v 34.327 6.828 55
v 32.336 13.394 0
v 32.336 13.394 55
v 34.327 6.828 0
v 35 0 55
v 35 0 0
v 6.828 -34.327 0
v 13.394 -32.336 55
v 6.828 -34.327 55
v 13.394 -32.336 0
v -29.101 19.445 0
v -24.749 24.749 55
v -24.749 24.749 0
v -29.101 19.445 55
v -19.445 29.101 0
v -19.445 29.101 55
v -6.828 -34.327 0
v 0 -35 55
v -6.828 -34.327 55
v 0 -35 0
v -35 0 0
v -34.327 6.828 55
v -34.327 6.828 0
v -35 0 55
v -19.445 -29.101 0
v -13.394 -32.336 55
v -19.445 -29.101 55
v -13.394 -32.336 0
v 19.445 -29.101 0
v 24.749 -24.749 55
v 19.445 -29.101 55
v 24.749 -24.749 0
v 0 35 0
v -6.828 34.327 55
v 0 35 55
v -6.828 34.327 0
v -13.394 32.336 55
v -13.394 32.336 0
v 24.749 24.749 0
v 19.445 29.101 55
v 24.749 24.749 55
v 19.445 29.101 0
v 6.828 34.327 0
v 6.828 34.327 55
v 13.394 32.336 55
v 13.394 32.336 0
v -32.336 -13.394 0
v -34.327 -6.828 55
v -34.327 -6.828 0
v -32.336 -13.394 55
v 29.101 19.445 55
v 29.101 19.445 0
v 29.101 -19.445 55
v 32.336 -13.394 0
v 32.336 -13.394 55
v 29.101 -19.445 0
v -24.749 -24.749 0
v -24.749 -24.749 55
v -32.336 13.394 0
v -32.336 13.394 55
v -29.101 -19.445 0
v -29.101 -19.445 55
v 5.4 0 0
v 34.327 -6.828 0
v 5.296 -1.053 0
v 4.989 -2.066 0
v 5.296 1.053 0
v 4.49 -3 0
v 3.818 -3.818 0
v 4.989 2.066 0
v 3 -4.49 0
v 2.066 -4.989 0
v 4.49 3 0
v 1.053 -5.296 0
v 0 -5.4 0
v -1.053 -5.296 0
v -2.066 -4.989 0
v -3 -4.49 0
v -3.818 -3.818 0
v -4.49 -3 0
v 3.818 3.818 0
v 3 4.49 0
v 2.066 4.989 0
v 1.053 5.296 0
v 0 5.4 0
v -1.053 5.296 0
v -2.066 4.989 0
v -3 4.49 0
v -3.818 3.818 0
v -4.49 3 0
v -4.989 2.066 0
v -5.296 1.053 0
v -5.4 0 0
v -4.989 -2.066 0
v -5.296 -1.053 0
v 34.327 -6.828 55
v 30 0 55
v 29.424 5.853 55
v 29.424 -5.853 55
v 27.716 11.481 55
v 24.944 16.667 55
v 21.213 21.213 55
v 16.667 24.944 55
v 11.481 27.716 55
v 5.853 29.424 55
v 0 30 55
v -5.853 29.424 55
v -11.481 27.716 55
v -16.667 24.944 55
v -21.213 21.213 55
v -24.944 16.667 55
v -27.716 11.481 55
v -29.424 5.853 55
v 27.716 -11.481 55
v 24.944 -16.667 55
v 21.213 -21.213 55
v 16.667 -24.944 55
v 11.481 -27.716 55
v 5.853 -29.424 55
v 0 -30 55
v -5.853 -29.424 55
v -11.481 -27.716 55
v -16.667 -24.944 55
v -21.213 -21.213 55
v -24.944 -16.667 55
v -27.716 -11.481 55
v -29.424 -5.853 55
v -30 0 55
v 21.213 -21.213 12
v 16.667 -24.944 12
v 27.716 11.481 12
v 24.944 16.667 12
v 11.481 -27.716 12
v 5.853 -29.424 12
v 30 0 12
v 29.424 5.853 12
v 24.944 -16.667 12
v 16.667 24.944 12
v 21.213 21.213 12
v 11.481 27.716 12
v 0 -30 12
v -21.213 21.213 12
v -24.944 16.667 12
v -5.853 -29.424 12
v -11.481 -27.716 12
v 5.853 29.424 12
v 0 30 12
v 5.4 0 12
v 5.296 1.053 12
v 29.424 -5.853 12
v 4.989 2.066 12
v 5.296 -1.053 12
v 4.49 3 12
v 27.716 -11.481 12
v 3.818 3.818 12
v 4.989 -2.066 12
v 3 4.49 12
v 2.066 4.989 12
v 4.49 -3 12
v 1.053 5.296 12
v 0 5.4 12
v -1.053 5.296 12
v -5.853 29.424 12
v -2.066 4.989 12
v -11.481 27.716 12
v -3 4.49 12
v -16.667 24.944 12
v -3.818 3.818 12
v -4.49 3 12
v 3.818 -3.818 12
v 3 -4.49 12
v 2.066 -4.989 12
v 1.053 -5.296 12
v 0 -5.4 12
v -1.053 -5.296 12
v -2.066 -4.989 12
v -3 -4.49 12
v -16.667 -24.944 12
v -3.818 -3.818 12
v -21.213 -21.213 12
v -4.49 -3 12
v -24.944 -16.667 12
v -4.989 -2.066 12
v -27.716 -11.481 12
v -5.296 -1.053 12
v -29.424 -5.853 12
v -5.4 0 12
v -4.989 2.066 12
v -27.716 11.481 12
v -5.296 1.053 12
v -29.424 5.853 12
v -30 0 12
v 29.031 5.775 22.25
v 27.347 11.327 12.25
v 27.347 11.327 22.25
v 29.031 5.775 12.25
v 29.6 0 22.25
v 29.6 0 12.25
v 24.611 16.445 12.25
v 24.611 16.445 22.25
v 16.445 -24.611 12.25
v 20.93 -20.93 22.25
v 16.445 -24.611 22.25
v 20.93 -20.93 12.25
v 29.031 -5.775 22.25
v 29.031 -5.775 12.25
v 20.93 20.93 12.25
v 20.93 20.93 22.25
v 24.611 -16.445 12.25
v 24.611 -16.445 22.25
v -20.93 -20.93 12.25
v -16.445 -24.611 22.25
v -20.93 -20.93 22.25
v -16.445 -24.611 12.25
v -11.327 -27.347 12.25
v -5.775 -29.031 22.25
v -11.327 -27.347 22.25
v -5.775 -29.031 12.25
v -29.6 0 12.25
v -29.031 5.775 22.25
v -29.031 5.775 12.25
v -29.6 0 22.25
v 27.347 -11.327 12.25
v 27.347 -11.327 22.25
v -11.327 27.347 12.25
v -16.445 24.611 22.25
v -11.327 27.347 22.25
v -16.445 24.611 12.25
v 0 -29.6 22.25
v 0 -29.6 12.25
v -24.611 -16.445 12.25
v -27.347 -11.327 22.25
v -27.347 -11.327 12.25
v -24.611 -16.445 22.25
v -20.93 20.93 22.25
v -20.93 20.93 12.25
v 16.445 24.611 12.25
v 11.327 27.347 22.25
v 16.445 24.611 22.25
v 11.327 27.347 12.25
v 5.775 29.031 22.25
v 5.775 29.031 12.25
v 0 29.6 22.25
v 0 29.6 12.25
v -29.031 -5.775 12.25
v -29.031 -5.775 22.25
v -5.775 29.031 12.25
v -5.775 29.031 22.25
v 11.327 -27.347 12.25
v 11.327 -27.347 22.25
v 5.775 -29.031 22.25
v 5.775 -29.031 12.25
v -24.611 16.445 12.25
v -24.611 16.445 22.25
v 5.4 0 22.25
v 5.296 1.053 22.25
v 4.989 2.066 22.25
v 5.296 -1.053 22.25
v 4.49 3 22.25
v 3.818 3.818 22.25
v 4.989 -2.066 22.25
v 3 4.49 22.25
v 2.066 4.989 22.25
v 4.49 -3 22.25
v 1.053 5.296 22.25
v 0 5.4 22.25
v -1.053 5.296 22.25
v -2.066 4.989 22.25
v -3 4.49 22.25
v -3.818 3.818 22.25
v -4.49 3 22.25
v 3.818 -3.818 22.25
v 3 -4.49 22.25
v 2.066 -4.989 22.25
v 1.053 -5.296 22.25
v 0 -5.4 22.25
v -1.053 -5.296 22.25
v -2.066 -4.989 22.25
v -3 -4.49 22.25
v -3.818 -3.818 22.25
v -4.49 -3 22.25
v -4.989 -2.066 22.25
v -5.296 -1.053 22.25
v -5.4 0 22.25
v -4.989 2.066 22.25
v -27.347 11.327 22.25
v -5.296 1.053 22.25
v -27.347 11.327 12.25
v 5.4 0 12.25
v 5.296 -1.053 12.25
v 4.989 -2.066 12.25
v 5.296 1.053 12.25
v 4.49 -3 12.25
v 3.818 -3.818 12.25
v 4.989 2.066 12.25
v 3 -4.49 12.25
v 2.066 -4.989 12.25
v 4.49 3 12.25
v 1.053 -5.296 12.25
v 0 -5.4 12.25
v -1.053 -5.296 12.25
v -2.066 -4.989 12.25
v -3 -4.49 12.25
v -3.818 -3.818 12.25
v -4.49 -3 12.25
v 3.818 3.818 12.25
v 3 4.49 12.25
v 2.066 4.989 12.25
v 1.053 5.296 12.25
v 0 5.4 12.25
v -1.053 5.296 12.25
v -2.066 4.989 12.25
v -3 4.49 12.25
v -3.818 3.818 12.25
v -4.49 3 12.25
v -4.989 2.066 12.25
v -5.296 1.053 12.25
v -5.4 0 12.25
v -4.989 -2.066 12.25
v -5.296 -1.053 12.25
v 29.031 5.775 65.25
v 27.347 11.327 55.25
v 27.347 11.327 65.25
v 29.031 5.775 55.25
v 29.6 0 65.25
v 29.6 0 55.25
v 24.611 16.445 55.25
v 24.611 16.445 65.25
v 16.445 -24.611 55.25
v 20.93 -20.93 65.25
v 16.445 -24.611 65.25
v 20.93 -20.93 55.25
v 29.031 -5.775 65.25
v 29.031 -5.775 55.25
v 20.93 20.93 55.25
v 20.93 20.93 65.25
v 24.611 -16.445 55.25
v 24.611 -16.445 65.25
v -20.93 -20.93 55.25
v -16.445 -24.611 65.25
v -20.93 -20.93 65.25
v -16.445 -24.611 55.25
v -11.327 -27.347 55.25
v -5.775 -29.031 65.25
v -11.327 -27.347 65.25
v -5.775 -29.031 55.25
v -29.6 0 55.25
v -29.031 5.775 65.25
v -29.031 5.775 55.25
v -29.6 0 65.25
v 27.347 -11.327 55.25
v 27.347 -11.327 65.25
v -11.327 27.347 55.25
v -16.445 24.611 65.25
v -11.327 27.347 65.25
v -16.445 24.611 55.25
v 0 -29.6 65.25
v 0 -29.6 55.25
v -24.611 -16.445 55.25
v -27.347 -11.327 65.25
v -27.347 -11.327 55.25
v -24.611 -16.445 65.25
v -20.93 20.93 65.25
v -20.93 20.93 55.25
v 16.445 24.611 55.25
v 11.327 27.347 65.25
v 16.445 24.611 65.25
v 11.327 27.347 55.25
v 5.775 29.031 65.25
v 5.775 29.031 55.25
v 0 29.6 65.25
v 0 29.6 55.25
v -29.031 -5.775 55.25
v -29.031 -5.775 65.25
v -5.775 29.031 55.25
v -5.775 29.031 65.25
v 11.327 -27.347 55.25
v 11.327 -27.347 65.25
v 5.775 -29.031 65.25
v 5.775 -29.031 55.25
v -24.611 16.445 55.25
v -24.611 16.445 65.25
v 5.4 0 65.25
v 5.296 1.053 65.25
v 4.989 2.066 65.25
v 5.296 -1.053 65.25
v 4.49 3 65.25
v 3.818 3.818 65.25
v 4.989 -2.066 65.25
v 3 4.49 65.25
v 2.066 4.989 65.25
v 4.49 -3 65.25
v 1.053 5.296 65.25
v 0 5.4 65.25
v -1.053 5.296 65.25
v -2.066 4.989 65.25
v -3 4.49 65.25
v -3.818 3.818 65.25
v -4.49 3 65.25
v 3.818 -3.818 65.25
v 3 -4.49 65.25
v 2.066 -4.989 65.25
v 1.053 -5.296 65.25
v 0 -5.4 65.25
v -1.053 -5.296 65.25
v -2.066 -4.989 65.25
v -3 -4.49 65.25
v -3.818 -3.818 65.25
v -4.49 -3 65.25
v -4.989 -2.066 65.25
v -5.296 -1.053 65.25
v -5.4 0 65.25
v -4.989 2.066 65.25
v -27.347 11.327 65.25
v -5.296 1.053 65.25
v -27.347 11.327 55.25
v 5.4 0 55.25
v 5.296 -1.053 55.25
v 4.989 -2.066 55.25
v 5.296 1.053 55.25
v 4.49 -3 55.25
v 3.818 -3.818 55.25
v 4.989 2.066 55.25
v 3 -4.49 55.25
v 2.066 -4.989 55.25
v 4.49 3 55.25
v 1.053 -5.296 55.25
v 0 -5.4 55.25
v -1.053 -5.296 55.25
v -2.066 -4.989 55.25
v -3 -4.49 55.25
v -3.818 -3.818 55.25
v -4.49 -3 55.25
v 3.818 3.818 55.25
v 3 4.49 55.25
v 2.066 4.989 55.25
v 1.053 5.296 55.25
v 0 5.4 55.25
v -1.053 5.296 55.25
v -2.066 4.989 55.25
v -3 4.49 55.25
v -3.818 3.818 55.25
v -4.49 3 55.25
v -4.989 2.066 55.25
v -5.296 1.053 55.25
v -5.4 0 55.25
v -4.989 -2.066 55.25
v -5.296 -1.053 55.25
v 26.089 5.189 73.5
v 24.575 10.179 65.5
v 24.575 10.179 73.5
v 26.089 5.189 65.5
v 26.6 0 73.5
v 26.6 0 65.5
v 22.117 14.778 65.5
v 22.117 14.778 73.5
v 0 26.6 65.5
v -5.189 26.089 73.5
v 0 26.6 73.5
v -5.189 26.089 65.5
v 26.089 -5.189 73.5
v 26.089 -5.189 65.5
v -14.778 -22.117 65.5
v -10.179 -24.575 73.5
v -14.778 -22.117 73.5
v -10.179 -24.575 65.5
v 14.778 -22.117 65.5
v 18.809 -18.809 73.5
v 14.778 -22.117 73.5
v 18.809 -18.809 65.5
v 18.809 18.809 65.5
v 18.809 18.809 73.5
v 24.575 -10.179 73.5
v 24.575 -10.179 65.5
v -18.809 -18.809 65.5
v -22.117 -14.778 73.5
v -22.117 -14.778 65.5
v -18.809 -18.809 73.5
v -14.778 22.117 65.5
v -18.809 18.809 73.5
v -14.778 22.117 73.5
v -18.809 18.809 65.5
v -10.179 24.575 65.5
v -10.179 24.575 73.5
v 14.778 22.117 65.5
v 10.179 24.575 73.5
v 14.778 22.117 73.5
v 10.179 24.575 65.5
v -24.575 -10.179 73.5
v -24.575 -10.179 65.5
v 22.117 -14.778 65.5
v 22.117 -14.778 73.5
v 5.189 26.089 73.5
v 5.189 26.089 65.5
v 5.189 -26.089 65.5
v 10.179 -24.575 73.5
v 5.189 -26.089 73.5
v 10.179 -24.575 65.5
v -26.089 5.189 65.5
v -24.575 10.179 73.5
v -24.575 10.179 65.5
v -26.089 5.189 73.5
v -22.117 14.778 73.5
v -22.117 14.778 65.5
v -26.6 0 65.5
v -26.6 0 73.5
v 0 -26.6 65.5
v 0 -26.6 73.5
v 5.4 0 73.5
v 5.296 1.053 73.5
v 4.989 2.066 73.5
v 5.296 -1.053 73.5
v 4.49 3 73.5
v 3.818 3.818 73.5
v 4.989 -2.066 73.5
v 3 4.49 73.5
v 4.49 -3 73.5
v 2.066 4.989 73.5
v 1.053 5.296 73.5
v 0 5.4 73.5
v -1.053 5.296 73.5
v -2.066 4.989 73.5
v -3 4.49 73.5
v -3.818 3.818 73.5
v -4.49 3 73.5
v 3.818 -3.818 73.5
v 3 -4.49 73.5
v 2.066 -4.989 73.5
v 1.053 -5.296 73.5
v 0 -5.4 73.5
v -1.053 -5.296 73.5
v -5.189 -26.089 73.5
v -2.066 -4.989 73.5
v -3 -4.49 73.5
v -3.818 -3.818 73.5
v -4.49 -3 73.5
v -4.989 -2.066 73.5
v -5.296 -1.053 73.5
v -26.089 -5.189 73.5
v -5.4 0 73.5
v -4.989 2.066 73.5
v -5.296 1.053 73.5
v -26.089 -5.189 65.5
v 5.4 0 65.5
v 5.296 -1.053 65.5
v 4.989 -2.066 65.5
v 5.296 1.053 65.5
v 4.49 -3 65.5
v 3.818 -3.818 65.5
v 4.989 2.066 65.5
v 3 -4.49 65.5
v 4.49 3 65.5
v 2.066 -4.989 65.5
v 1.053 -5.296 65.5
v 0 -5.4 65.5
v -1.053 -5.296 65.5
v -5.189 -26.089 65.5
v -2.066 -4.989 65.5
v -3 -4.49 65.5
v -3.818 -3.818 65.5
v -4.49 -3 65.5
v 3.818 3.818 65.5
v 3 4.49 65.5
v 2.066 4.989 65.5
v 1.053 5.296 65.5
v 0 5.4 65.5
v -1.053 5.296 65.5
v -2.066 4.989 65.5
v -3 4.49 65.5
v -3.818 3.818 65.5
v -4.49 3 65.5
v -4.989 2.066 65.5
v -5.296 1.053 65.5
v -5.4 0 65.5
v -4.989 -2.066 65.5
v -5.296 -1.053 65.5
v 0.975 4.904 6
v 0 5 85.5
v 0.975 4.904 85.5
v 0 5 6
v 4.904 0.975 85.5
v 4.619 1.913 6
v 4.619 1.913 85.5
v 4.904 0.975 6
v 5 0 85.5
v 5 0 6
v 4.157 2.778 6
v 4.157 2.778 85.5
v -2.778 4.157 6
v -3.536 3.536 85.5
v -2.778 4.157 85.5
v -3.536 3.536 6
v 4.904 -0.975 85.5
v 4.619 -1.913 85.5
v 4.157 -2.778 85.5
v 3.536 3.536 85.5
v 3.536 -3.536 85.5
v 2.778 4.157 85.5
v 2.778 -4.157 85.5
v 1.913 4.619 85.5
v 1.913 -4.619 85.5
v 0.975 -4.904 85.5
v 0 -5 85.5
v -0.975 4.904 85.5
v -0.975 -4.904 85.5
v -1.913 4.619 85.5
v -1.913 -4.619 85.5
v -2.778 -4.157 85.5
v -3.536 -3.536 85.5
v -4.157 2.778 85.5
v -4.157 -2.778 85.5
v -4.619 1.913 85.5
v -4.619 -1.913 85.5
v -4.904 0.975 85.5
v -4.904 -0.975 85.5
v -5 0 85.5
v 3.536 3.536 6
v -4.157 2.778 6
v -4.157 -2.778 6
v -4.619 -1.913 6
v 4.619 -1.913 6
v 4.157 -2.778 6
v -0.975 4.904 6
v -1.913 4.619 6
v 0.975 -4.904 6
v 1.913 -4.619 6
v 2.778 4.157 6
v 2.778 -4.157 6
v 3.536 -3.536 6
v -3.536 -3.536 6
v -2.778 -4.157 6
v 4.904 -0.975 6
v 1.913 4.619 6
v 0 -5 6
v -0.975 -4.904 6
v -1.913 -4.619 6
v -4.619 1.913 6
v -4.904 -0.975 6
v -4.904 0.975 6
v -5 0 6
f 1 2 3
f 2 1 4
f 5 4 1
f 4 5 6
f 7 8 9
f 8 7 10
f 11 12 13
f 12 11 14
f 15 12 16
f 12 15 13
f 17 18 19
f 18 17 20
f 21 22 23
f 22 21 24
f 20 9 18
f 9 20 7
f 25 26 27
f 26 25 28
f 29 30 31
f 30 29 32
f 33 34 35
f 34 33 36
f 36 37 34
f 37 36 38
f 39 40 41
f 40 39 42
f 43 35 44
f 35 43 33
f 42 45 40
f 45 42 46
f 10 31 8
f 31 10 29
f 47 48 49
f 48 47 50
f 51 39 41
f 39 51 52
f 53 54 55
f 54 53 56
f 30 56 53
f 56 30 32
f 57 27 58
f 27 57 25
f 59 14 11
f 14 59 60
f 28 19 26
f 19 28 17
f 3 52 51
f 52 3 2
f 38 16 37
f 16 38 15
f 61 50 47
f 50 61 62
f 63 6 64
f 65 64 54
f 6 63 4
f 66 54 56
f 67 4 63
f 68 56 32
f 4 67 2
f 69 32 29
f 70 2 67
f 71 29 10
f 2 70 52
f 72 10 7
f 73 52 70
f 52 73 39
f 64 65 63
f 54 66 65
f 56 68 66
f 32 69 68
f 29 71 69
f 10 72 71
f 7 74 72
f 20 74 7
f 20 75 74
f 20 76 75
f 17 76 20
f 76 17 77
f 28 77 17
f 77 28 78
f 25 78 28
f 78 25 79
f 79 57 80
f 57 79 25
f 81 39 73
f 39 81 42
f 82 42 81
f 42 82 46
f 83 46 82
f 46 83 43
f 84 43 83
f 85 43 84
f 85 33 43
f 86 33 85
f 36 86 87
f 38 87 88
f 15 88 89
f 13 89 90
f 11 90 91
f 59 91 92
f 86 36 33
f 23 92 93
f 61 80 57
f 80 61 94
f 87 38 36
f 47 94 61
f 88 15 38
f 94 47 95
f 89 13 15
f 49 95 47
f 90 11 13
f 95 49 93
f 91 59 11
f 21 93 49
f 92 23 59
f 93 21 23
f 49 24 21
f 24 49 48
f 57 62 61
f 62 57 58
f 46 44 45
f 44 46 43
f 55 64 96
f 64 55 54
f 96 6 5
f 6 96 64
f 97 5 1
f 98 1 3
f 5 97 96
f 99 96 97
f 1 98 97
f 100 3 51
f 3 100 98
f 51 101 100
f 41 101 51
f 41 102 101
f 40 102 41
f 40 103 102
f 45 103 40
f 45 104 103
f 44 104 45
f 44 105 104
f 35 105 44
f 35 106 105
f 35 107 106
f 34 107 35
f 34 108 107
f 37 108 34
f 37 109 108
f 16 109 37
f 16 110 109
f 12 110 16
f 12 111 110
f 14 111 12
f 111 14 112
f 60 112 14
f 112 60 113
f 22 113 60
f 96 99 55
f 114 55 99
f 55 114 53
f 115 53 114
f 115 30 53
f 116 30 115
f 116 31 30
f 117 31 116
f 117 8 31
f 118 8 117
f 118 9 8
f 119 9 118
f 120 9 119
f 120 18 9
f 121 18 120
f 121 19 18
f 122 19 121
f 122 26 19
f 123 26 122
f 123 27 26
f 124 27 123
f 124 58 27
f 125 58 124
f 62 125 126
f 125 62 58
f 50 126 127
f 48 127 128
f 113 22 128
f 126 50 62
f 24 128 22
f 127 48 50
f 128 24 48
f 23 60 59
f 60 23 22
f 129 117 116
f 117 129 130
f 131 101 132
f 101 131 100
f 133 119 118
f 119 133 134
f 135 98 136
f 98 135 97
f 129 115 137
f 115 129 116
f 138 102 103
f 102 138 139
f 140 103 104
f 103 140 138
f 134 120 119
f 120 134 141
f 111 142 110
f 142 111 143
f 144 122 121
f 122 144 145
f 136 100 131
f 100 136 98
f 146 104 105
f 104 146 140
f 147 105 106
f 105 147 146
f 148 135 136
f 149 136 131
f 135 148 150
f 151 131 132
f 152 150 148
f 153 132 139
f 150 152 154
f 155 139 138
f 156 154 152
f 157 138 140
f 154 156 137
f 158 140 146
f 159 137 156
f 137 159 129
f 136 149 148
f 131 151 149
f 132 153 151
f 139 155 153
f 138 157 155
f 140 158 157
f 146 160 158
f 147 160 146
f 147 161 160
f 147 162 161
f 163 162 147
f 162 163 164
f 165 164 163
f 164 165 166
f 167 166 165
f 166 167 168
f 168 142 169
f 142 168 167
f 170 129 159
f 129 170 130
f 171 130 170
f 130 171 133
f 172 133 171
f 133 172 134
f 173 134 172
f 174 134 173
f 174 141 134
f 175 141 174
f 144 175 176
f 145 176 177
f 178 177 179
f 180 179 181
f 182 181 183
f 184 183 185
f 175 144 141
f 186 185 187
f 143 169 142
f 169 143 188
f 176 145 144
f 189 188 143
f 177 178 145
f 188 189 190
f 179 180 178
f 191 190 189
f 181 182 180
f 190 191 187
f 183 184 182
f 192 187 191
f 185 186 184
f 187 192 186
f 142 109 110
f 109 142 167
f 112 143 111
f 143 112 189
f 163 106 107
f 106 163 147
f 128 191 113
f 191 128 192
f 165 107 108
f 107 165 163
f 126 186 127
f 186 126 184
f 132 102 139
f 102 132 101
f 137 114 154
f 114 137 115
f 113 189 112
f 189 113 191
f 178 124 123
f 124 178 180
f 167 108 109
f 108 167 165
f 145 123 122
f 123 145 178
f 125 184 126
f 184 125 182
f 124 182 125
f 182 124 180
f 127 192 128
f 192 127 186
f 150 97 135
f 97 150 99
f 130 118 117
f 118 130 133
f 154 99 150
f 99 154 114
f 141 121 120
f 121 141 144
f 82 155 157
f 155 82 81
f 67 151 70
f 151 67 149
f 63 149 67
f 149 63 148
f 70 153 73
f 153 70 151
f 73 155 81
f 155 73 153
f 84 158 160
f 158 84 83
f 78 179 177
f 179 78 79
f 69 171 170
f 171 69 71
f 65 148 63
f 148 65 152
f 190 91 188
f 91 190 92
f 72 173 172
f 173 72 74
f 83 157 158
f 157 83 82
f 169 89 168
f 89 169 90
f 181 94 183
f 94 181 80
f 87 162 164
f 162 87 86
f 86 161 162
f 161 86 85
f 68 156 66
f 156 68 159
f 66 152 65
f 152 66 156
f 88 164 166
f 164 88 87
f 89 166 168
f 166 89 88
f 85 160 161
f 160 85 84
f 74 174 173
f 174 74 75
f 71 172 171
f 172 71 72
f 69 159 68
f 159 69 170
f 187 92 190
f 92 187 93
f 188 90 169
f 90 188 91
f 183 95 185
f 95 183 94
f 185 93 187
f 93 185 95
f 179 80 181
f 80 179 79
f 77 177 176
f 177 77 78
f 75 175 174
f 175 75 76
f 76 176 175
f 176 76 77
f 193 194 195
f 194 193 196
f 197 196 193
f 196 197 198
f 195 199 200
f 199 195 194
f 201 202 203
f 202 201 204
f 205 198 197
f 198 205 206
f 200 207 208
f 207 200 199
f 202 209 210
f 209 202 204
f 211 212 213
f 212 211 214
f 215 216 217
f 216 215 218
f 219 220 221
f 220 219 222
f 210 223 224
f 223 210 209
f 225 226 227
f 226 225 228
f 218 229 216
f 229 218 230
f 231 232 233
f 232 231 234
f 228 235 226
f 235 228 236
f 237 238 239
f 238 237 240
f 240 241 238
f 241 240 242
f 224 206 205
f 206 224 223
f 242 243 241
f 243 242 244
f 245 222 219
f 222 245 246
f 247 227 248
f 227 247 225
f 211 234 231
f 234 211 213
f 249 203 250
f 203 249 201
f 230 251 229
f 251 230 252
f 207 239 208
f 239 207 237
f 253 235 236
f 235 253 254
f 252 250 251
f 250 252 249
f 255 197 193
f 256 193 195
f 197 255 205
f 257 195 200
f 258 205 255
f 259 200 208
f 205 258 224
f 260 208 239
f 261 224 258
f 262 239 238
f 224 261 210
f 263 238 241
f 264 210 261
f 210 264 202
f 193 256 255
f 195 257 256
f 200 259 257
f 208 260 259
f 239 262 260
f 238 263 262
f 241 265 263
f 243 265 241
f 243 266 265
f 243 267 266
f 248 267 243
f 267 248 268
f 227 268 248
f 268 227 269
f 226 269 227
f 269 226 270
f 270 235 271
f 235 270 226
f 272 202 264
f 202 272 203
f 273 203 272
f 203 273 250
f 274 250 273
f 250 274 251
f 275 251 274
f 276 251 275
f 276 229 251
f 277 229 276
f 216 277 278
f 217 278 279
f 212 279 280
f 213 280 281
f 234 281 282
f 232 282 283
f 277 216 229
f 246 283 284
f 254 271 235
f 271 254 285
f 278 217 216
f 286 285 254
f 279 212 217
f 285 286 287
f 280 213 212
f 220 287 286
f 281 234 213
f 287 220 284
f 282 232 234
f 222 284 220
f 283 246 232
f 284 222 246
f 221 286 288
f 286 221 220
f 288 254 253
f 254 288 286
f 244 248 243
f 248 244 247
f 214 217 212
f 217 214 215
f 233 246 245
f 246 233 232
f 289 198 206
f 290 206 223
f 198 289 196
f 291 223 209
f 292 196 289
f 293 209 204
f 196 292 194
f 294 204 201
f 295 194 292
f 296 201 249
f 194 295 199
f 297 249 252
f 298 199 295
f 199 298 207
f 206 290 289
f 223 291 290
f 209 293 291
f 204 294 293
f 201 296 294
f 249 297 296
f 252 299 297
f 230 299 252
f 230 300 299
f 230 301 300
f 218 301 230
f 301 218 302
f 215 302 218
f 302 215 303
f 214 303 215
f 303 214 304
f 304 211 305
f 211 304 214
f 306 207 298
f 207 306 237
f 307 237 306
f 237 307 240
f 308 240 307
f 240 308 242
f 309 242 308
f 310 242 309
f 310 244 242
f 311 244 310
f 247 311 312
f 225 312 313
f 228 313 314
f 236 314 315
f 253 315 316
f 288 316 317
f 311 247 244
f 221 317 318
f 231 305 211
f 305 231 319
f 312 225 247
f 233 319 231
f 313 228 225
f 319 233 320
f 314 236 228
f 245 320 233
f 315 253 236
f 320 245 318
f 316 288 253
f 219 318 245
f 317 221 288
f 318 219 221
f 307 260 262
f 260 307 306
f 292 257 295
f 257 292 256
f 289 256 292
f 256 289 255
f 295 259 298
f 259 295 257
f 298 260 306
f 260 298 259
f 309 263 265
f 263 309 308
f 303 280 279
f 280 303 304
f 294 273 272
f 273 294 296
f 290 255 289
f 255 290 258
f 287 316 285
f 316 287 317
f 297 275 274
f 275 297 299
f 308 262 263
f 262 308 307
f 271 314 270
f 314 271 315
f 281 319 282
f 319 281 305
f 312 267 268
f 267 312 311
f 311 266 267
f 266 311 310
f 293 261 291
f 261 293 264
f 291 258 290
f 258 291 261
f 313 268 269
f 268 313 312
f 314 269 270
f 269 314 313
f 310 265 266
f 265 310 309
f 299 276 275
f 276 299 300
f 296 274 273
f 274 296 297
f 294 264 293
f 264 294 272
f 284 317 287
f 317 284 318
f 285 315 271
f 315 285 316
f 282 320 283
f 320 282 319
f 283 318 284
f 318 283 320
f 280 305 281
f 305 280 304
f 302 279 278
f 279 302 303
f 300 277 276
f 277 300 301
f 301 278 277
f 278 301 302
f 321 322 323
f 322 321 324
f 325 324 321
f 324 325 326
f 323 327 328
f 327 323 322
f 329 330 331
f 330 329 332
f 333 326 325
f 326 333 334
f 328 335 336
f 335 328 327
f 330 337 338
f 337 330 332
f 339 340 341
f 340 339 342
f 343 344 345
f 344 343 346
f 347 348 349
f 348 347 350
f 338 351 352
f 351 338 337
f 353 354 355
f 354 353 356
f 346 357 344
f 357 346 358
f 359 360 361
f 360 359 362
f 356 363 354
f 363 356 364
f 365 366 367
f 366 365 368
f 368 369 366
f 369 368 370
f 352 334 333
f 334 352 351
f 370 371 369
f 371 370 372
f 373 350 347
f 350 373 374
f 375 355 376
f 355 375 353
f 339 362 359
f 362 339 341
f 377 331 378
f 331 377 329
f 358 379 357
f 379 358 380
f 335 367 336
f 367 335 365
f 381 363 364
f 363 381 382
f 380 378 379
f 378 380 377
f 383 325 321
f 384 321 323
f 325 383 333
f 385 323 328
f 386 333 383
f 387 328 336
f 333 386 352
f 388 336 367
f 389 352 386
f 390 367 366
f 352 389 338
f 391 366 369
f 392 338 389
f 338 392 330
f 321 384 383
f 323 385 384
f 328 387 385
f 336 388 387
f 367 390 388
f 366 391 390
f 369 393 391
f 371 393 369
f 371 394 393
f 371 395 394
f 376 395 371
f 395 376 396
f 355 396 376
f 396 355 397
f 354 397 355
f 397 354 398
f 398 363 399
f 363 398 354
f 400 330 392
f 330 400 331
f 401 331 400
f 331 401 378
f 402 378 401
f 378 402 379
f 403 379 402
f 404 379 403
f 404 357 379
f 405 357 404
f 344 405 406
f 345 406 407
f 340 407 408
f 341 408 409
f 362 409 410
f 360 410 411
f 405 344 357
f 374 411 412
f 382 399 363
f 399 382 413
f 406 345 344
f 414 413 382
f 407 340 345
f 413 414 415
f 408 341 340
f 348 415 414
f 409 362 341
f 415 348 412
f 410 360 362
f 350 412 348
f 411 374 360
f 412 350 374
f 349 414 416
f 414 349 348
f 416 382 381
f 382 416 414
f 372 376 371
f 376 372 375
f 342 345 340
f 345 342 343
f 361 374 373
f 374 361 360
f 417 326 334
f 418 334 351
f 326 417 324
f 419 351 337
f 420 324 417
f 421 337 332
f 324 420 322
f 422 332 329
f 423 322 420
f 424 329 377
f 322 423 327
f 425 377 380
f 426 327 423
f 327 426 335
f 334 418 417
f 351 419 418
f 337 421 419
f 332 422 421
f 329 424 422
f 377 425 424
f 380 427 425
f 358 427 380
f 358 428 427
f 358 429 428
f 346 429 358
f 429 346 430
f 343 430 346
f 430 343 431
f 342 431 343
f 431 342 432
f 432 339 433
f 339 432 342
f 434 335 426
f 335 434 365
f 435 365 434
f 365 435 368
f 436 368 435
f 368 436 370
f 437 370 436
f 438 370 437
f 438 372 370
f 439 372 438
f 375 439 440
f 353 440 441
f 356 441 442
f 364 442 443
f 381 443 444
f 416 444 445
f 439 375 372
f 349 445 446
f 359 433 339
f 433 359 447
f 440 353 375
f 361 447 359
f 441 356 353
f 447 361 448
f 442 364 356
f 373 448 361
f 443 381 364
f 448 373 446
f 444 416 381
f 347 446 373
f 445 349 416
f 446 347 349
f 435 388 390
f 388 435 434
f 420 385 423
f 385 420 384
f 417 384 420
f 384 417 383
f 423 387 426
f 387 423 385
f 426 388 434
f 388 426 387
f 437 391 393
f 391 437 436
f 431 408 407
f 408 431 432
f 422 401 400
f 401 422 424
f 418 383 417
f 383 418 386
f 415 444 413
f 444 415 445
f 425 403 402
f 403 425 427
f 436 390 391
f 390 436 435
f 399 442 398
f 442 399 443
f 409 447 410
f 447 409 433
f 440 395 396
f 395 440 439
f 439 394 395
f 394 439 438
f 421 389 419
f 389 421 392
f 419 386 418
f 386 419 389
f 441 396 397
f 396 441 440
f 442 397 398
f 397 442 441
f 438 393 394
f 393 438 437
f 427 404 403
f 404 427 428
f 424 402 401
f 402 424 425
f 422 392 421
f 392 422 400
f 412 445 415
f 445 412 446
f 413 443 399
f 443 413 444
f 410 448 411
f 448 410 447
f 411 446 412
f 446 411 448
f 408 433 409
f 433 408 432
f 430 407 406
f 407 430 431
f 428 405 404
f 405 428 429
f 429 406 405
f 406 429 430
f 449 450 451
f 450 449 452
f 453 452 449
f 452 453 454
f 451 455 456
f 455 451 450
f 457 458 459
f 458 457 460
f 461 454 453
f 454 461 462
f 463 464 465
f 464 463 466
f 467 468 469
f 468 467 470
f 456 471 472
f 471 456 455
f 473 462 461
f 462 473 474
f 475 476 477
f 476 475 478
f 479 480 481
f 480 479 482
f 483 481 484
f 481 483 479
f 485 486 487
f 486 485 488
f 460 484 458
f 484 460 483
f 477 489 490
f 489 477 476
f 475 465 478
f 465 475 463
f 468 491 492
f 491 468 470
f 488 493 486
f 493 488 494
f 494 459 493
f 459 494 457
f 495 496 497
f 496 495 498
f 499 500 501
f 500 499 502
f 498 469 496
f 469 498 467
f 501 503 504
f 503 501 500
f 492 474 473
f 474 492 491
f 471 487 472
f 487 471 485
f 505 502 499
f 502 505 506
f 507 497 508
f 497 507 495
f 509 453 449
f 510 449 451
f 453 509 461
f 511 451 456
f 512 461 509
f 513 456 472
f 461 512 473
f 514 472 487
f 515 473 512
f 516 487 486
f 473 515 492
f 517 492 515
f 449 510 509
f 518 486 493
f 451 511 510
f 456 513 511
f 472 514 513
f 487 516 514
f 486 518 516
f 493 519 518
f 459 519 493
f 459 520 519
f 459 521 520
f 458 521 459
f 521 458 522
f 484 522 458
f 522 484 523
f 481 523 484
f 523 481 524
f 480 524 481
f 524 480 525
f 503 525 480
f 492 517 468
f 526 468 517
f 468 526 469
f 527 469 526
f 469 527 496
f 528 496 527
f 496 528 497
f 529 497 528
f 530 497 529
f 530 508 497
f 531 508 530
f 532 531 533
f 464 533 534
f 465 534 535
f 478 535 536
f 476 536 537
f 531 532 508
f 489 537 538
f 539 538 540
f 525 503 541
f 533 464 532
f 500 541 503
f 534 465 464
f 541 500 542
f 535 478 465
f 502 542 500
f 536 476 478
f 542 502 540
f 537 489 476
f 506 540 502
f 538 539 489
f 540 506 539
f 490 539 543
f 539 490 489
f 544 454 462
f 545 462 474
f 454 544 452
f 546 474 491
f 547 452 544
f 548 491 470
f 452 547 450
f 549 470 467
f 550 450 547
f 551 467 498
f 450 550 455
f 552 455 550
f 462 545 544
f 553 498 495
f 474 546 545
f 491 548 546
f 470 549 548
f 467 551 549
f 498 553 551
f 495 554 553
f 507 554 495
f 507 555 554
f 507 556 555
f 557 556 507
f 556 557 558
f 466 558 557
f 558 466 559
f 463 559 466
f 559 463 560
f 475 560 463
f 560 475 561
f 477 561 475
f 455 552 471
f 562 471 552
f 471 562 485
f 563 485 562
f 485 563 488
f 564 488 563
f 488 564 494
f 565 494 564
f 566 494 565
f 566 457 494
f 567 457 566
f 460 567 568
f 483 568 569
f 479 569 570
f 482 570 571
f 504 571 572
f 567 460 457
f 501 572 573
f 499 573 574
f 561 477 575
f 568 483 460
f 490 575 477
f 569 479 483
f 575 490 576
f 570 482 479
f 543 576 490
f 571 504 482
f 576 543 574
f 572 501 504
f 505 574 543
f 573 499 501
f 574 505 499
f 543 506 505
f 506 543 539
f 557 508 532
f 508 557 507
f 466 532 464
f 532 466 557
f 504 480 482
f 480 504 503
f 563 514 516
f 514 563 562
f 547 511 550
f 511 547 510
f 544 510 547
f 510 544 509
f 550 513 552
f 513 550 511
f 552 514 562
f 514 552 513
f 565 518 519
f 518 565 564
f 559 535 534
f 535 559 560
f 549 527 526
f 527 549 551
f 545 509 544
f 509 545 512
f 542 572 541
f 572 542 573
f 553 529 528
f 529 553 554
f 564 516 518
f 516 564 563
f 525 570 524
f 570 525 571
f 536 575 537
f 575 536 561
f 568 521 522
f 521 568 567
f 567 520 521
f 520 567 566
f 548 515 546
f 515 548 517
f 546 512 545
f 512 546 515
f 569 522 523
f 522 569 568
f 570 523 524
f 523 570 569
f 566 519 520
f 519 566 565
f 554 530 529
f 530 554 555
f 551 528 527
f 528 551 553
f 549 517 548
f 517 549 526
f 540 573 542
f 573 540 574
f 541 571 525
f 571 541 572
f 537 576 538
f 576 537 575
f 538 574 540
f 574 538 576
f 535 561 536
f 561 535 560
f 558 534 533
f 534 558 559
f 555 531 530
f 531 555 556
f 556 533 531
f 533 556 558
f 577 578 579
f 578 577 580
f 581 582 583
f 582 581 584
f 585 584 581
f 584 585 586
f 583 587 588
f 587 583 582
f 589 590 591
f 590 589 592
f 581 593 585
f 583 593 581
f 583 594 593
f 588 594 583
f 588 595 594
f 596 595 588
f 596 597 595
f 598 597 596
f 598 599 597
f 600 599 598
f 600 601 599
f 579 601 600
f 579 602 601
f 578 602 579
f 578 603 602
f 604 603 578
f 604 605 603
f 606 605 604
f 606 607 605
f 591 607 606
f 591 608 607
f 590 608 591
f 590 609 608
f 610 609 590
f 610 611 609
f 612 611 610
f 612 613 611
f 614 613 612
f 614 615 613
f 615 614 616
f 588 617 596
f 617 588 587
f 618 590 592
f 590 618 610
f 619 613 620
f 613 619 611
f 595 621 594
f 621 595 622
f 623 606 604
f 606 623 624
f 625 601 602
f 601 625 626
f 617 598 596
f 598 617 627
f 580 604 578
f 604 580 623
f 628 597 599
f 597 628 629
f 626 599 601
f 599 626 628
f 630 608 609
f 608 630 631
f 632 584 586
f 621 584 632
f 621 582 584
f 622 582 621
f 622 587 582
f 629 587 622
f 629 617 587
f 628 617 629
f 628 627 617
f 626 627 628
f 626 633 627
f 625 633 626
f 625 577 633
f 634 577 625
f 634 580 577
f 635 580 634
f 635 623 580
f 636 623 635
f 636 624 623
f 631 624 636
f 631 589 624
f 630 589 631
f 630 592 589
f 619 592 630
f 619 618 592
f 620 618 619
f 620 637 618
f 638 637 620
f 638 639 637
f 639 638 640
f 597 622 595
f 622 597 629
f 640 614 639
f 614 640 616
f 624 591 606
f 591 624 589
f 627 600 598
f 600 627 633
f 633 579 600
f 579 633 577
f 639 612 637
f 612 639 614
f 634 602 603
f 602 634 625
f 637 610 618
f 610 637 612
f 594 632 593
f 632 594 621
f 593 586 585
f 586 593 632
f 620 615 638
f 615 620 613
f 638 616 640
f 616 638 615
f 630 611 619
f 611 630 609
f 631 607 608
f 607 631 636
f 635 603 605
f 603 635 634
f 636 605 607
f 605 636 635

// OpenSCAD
$fn = 32;

// ------------------------------------------------------------------------
// Bearing housing: housing d70, two bearings and a shaft
// Every part is its own module, assembly() places them once.
// ------------------------------------------------------------------------

// --- part 1 ---
module housing() {
  difference() {
    cylinder(h = 55, d = 70);
    translate([0, 0, 12]) cylinder(h = 44, d = 60);
    translate([0, 0, -1]) cylinder(h = 14, d = 10.8);
  }
}

// --- part 2 ---
module bearing_lower() {
  difference() {
      translate([0, 0, 0]) cylinder(h = 10, d = 59.2);
      translate([0, 0, -1]) cylinder(h = 12, d = 10.8);
    }
}

// --- part 3 ---
module bearing_upper() {
  difference() {
      translate([0, 0, 0]) cylinder(h = 10, d = 59.2);
      translate([0, 0, -1]) cylinder(h = 12, d = 10.8);
    }
}

// --- part 4 ---
module spacer() {
  difference() {
      translate([0, 0, 0]) cylinder(h = 8, d = 53.2);
      translate([0, 0, -1]) cylinder(h = 10, d = 10.8);
    }
}

// --- part 5 ---
module shaft() {
  translate([0, 0, -39.75]) cylinder(h = 79.5, d = 10);
}

// --- assembly ---
module assembly() {
  translate([0, 0, 0]) rotate([0, 0, 0]) housing();
  translate([0, 0, 12.25]) rotate([0, 0, 0]) bearing_lower();
  translate([0, 0, 55.25]) rotate([0, 0, 0]) bearing_upper();
  translate([0, 0, 65.5]) rotate([0, 0, 0]) spacer();
  translate([0, 0, 45.75]) rotate([0, 0, 0]) shaft();
}

assembly();
